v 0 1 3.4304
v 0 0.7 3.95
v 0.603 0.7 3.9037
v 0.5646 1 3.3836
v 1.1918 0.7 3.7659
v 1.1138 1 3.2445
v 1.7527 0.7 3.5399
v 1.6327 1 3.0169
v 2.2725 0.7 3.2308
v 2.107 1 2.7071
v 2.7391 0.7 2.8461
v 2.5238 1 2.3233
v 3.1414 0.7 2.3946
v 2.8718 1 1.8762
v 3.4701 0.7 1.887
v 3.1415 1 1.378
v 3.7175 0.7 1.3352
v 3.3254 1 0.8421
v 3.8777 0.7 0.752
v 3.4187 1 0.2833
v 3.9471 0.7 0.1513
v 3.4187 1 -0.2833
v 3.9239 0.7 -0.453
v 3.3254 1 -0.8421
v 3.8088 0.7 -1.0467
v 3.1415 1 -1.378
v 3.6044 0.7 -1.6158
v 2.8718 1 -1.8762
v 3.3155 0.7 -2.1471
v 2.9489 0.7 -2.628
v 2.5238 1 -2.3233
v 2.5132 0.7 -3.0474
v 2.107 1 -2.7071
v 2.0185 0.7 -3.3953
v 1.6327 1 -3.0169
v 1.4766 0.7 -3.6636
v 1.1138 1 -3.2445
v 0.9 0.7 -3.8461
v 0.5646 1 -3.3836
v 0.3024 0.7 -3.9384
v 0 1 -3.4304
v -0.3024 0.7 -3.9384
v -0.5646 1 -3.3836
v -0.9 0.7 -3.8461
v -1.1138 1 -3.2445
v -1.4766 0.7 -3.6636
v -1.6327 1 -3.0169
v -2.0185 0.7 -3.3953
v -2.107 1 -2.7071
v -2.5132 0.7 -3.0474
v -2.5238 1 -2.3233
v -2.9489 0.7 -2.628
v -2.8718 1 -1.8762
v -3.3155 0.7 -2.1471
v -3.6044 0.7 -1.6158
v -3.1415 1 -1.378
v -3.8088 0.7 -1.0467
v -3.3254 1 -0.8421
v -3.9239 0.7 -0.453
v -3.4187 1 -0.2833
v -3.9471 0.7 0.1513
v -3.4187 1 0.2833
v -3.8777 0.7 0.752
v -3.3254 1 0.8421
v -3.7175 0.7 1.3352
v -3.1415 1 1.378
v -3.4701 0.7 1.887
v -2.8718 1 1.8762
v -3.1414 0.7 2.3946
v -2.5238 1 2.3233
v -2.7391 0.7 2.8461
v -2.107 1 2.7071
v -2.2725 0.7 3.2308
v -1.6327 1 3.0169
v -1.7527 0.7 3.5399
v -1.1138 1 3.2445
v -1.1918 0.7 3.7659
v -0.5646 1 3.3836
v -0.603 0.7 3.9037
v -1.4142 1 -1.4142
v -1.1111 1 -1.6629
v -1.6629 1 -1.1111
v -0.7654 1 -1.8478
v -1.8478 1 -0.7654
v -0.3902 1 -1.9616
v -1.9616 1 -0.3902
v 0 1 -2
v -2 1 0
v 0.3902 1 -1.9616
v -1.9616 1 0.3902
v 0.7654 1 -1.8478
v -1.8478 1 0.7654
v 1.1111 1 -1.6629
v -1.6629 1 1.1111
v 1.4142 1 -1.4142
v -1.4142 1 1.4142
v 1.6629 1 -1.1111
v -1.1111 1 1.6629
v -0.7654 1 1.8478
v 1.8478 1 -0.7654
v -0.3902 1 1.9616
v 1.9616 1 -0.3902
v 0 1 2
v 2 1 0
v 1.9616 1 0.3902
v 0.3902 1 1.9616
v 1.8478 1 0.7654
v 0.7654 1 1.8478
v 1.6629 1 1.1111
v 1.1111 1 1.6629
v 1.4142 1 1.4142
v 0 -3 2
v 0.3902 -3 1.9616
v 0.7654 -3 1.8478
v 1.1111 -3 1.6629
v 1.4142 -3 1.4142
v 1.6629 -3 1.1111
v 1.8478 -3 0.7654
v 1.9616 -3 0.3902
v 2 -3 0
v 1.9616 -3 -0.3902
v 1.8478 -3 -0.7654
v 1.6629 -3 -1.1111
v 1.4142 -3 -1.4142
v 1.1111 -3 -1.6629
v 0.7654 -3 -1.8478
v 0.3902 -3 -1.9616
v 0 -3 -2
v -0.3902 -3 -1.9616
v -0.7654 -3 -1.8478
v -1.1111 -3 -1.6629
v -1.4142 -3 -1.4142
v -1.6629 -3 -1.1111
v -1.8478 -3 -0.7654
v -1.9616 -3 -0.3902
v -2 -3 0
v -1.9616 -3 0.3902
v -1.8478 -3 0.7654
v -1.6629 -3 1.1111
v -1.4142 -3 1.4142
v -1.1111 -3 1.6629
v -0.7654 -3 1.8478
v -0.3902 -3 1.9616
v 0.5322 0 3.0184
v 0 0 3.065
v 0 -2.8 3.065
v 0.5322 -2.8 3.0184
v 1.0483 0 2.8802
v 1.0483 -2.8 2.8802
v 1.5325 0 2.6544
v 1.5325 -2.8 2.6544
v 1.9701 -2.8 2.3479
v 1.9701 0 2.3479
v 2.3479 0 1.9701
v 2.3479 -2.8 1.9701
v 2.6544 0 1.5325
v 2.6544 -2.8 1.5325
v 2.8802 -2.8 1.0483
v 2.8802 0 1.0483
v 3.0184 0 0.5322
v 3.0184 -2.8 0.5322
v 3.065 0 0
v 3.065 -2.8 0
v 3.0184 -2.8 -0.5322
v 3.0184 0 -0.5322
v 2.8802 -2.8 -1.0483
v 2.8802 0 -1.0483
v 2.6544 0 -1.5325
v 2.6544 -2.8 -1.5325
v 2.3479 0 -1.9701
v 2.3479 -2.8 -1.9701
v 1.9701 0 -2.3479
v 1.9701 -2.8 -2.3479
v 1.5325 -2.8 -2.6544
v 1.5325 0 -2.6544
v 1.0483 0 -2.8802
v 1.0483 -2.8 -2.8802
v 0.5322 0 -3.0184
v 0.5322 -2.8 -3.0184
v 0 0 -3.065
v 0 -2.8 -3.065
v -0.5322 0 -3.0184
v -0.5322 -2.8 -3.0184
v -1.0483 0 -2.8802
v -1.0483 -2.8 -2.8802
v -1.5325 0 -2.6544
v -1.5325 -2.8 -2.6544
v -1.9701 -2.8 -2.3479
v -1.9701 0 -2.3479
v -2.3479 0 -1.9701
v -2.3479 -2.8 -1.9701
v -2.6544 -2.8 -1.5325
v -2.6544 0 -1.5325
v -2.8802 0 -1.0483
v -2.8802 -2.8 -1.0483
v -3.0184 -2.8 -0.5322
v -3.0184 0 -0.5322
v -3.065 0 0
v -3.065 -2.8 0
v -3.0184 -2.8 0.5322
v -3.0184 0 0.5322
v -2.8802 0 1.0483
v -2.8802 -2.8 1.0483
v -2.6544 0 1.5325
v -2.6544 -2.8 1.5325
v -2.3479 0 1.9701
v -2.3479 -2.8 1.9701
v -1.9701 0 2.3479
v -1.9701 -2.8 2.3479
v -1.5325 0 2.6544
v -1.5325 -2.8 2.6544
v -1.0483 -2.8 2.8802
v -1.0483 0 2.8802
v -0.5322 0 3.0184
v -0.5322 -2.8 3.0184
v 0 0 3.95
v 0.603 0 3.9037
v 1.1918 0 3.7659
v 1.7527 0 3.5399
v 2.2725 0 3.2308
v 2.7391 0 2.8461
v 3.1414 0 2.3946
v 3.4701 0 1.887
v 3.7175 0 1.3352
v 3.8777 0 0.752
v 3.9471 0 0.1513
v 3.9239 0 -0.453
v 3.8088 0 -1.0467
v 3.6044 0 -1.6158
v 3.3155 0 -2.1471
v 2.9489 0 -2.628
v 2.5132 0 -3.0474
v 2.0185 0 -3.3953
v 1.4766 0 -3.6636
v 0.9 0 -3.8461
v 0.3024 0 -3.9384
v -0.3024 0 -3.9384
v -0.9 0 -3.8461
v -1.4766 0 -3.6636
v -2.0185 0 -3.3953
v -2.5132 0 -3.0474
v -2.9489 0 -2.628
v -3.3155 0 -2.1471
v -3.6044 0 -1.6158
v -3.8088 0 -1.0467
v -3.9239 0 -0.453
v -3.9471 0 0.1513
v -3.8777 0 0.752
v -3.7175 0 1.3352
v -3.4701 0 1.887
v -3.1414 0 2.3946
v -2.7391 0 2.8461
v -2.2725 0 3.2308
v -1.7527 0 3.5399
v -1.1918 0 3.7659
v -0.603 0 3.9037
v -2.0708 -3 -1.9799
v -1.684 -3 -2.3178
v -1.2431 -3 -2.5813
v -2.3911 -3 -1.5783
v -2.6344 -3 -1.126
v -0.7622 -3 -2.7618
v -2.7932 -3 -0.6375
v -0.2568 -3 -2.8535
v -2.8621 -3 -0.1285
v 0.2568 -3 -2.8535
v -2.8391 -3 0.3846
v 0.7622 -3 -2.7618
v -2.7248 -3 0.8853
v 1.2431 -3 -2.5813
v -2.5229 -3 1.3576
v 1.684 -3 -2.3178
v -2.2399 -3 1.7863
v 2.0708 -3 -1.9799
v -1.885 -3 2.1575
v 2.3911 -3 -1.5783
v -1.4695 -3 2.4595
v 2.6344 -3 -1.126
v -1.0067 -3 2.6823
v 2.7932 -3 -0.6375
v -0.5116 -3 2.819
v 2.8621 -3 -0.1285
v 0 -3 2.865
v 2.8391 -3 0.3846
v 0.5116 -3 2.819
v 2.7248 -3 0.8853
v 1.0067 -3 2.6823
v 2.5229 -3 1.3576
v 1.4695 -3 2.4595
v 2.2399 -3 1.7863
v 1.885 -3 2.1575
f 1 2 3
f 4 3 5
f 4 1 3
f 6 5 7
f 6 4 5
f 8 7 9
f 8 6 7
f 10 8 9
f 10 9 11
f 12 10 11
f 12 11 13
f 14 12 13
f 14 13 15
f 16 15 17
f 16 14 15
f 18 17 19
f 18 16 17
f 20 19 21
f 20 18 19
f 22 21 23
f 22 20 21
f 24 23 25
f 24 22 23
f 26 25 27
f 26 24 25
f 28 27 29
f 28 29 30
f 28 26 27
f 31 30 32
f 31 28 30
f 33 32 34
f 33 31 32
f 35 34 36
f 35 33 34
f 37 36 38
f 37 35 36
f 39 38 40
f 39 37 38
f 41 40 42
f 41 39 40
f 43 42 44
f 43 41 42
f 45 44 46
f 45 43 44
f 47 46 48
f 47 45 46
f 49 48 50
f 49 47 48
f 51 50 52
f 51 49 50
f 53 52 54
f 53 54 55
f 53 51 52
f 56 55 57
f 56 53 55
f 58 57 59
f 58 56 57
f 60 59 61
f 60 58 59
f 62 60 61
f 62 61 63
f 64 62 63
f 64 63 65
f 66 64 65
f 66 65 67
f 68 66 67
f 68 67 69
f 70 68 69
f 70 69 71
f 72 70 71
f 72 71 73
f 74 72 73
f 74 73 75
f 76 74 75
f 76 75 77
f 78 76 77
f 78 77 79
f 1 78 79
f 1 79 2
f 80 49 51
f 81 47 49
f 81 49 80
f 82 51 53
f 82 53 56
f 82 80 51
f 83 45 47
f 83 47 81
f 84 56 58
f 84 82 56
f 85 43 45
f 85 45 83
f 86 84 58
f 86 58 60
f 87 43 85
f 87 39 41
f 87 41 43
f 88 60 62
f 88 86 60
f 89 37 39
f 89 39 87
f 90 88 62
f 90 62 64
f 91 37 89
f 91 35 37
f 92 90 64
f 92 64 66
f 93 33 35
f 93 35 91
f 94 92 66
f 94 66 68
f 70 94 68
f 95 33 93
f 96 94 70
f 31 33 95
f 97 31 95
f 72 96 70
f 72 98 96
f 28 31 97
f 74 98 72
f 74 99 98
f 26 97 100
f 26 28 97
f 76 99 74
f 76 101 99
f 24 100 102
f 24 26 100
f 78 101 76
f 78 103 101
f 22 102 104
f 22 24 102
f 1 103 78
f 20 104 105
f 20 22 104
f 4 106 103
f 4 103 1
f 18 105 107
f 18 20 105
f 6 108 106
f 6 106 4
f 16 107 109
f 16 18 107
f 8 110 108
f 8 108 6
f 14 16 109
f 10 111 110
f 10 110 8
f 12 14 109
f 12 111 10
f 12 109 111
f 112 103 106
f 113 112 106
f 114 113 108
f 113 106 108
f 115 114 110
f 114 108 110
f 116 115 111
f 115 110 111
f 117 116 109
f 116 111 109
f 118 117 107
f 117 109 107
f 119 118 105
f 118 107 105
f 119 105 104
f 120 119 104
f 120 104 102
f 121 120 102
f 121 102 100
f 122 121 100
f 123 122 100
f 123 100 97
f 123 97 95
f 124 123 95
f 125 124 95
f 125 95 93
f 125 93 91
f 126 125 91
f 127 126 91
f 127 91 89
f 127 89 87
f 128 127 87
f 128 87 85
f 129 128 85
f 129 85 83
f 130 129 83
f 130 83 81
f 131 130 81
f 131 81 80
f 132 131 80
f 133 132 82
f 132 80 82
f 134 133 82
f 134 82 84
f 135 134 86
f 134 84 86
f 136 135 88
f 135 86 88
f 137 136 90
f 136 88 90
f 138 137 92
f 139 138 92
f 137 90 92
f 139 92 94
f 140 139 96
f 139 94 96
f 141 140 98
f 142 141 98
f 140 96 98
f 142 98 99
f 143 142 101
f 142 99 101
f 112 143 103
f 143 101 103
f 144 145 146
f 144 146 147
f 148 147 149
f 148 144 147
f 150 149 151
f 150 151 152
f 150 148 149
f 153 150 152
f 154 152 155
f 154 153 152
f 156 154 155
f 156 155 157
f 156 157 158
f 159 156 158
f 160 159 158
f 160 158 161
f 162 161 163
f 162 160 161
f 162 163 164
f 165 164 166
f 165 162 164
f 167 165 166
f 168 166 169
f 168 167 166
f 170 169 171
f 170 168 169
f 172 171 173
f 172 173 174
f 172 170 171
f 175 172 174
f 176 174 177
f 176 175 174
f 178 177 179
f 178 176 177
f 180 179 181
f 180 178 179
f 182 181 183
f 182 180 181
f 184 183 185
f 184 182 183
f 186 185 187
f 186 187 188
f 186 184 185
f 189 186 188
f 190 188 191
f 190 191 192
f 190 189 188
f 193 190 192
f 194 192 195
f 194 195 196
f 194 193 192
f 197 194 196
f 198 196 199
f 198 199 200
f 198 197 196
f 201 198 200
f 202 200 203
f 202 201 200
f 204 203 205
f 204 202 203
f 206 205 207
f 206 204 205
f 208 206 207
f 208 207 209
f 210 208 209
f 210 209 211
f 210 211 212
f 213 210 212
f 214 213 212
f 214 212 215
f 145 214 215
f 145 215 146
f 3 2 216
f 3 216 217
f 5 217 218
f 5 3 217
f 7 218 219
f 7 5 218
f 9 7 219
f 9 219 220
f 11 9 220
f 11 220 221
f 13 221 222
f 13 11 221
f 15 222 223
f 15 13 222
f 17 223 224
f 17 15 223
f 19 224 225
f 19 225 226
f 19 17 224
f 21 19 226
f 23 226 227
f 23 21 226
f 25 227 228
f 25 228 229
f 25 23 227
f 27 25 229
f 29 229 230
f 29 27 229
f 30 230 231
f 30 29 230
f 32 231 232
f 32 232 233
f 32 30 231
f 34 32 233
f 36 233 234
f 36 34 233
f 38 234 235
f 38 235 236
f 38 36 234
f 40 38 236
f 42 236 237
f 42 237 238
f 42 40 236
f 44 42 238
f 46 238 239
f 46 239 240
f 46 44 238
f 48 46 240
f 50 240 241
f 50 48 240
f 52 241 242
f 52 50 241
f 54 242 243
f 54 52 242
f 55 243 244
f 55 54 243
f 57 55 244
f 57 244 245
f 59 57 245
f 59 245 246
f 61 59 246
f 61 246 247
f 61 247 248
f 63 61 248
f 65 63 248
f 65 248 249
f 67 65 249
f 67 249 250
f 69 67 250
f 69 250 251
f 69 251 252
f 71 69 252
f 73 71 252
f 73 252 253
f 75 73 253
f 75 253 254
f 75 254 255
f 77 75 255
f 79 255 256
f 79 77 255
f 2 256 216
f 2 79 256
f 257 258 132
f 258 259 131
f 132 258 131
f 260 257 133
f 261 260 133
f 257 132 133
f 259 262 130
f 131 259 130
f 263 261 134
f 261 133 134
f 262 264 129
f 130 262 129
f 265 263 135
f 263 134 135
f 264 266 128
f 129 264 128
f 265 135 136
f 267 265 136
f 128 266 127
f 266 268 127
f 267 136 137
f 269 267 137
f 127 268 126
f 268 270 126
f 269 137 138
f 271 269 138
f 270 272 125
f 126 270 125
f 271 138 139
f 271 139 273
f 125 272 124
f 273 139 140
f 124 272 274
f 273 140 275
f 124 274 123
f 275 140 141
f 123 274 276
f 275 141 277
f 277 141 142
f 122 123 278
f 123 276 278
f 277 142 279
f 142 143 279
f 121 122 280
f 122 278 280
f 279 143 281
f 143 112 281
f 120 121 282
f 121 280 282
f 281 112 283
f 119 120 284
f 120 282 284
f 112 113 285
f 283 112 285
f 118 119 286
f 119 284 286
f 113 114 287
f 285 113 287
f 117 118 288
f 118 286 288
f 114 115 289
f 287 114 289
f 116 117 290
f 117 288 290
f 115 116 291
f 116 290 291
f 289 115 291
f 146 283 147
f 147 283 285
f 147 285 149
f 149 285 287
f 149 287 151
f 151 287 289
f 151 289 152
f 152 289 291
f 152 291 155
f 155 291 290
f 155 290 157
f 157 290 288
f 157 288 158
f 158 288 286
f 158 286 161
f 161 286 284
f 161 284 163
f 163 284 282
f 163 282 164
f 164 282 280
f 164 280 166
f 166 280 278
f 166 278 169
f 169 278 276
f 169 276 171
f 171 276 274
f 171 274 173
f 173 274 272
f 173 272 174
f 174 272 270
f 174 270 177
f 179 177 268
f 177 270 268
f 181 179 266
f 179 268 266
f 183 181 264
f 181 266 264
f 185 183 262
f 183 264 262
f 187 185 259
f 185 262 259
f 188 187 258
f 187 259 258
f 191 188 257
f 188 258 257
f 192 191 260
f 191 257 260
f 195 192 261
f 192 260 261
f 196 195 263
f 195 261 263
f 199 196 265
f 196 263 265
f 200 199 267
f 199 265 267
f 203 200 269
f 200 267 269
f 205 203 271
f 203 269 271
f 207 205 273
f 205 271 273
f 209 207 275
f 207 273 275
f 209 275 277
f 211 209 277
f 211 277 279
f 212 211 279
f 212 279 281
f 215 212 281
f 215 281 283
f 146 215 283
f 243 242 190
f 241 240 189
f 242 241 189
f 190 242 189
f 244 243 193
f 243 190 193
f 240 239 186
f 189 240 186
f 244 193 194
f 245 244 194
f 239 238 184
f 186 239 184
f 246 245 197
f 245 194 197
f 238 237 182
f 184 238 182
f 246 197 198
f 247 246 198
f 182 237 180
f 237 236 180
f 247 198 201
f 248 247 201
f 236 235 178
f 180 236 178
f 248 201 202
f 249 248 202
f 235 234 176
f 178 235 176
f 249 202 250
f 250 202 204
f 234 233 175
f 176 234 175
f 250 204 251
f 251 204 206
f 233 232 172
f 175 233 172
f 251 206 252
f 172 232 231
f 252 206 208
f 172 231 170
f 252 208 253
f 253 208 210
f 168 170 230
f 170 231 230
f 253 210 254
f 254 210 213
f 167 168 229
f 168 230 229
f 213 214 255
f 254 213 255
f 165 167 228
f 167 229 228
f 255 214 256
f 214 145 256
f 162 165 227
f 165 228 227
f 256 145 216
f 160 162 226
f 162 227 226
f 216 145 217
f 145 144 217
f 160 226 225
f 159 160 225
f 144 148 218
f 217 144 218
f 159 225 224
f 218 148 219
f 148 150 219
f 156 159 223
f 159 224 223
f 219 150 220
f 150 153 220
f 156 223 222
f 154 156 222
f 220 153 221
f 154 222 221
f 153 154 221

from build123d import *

# Parameters (mm, degrees)
SKETCH_1_R      = 3.065
SKETCH_1_R_2    = 2
EXTRUDE_1_DEPTH = 3
EXTRUDE_START   = 1
SKETCH_2_R      = 3.95
SKETCH_2_R_2    = 2
EXTRUDE_2_DEPTH = 1
CHAMFER_1_SIZE  = 0.3
CHAMFER_1_SIZE2 = 0.519615242
CHAMFER_2_SIZE  = 0.2


with BuildPart() as part:
    # 草图1 → 凸台-拉伸1 (new body)
    with BuildSketch(Plane(origin=(0, 0, 0), x_dir=(1, 0, 0), z_dir=(0, 1, 0))):
        with Locations(Location((0, 0, 0), (0, 0, 270))):
            Circle(SKETCH_1_R)
        with Locations(Location((0, 0, 0), (0, 0, 270))):
            Circle(SKETCH_1_R_2, mode=Mode.SUBTRACT)
    extrude(amount=-EXTRUDE_1_DEPTH)

    # 草图2 → 凸台-拉伸2 (add)
    with BuildSketch(Plane(origin=(0, 0, 0), x_dir=(1, 0, 0), z_dir=(0, 1, 0)).offset(EXTRUDE_START)):
        with Locations(Location((0, 0, 0), (0, 0, 270))):
            Circle(SKETCH_2_R)
        with Locations(Location((0, 0, 0), (0, 0, 270))):
            Circle(SKETCH_2_R_2, mode=Mode.SUBTRACT)
    extrude(amount=-EXTRUDE_2_DEPTH)

    # 倒角1
    chamfer_1_edges = [part.edges().sort_by_distance(p)[0] for p in [
        (0, 1, -3.95),
    ]]
    chamfer_1_side = [part.faces().sort_by_distance(p)[0] for p in [
        (0, 0.5, -3.95),
    ]]
    chamfer(chamfer_1_edges, length=CHAMFER_1_SIZE, length2=CHAMFER_1_SIZE2, reference=chamfer_1_side[0])

    # 倒角2
    chamfer_2_edges = [part.edges().sort_by_distance(p)[0] for p in [
        (0, -3, -3.065),
    ]]
    chamfer(chamfer_2_edges, length=CHAMFER_2_SIZE)


solid = part.part
